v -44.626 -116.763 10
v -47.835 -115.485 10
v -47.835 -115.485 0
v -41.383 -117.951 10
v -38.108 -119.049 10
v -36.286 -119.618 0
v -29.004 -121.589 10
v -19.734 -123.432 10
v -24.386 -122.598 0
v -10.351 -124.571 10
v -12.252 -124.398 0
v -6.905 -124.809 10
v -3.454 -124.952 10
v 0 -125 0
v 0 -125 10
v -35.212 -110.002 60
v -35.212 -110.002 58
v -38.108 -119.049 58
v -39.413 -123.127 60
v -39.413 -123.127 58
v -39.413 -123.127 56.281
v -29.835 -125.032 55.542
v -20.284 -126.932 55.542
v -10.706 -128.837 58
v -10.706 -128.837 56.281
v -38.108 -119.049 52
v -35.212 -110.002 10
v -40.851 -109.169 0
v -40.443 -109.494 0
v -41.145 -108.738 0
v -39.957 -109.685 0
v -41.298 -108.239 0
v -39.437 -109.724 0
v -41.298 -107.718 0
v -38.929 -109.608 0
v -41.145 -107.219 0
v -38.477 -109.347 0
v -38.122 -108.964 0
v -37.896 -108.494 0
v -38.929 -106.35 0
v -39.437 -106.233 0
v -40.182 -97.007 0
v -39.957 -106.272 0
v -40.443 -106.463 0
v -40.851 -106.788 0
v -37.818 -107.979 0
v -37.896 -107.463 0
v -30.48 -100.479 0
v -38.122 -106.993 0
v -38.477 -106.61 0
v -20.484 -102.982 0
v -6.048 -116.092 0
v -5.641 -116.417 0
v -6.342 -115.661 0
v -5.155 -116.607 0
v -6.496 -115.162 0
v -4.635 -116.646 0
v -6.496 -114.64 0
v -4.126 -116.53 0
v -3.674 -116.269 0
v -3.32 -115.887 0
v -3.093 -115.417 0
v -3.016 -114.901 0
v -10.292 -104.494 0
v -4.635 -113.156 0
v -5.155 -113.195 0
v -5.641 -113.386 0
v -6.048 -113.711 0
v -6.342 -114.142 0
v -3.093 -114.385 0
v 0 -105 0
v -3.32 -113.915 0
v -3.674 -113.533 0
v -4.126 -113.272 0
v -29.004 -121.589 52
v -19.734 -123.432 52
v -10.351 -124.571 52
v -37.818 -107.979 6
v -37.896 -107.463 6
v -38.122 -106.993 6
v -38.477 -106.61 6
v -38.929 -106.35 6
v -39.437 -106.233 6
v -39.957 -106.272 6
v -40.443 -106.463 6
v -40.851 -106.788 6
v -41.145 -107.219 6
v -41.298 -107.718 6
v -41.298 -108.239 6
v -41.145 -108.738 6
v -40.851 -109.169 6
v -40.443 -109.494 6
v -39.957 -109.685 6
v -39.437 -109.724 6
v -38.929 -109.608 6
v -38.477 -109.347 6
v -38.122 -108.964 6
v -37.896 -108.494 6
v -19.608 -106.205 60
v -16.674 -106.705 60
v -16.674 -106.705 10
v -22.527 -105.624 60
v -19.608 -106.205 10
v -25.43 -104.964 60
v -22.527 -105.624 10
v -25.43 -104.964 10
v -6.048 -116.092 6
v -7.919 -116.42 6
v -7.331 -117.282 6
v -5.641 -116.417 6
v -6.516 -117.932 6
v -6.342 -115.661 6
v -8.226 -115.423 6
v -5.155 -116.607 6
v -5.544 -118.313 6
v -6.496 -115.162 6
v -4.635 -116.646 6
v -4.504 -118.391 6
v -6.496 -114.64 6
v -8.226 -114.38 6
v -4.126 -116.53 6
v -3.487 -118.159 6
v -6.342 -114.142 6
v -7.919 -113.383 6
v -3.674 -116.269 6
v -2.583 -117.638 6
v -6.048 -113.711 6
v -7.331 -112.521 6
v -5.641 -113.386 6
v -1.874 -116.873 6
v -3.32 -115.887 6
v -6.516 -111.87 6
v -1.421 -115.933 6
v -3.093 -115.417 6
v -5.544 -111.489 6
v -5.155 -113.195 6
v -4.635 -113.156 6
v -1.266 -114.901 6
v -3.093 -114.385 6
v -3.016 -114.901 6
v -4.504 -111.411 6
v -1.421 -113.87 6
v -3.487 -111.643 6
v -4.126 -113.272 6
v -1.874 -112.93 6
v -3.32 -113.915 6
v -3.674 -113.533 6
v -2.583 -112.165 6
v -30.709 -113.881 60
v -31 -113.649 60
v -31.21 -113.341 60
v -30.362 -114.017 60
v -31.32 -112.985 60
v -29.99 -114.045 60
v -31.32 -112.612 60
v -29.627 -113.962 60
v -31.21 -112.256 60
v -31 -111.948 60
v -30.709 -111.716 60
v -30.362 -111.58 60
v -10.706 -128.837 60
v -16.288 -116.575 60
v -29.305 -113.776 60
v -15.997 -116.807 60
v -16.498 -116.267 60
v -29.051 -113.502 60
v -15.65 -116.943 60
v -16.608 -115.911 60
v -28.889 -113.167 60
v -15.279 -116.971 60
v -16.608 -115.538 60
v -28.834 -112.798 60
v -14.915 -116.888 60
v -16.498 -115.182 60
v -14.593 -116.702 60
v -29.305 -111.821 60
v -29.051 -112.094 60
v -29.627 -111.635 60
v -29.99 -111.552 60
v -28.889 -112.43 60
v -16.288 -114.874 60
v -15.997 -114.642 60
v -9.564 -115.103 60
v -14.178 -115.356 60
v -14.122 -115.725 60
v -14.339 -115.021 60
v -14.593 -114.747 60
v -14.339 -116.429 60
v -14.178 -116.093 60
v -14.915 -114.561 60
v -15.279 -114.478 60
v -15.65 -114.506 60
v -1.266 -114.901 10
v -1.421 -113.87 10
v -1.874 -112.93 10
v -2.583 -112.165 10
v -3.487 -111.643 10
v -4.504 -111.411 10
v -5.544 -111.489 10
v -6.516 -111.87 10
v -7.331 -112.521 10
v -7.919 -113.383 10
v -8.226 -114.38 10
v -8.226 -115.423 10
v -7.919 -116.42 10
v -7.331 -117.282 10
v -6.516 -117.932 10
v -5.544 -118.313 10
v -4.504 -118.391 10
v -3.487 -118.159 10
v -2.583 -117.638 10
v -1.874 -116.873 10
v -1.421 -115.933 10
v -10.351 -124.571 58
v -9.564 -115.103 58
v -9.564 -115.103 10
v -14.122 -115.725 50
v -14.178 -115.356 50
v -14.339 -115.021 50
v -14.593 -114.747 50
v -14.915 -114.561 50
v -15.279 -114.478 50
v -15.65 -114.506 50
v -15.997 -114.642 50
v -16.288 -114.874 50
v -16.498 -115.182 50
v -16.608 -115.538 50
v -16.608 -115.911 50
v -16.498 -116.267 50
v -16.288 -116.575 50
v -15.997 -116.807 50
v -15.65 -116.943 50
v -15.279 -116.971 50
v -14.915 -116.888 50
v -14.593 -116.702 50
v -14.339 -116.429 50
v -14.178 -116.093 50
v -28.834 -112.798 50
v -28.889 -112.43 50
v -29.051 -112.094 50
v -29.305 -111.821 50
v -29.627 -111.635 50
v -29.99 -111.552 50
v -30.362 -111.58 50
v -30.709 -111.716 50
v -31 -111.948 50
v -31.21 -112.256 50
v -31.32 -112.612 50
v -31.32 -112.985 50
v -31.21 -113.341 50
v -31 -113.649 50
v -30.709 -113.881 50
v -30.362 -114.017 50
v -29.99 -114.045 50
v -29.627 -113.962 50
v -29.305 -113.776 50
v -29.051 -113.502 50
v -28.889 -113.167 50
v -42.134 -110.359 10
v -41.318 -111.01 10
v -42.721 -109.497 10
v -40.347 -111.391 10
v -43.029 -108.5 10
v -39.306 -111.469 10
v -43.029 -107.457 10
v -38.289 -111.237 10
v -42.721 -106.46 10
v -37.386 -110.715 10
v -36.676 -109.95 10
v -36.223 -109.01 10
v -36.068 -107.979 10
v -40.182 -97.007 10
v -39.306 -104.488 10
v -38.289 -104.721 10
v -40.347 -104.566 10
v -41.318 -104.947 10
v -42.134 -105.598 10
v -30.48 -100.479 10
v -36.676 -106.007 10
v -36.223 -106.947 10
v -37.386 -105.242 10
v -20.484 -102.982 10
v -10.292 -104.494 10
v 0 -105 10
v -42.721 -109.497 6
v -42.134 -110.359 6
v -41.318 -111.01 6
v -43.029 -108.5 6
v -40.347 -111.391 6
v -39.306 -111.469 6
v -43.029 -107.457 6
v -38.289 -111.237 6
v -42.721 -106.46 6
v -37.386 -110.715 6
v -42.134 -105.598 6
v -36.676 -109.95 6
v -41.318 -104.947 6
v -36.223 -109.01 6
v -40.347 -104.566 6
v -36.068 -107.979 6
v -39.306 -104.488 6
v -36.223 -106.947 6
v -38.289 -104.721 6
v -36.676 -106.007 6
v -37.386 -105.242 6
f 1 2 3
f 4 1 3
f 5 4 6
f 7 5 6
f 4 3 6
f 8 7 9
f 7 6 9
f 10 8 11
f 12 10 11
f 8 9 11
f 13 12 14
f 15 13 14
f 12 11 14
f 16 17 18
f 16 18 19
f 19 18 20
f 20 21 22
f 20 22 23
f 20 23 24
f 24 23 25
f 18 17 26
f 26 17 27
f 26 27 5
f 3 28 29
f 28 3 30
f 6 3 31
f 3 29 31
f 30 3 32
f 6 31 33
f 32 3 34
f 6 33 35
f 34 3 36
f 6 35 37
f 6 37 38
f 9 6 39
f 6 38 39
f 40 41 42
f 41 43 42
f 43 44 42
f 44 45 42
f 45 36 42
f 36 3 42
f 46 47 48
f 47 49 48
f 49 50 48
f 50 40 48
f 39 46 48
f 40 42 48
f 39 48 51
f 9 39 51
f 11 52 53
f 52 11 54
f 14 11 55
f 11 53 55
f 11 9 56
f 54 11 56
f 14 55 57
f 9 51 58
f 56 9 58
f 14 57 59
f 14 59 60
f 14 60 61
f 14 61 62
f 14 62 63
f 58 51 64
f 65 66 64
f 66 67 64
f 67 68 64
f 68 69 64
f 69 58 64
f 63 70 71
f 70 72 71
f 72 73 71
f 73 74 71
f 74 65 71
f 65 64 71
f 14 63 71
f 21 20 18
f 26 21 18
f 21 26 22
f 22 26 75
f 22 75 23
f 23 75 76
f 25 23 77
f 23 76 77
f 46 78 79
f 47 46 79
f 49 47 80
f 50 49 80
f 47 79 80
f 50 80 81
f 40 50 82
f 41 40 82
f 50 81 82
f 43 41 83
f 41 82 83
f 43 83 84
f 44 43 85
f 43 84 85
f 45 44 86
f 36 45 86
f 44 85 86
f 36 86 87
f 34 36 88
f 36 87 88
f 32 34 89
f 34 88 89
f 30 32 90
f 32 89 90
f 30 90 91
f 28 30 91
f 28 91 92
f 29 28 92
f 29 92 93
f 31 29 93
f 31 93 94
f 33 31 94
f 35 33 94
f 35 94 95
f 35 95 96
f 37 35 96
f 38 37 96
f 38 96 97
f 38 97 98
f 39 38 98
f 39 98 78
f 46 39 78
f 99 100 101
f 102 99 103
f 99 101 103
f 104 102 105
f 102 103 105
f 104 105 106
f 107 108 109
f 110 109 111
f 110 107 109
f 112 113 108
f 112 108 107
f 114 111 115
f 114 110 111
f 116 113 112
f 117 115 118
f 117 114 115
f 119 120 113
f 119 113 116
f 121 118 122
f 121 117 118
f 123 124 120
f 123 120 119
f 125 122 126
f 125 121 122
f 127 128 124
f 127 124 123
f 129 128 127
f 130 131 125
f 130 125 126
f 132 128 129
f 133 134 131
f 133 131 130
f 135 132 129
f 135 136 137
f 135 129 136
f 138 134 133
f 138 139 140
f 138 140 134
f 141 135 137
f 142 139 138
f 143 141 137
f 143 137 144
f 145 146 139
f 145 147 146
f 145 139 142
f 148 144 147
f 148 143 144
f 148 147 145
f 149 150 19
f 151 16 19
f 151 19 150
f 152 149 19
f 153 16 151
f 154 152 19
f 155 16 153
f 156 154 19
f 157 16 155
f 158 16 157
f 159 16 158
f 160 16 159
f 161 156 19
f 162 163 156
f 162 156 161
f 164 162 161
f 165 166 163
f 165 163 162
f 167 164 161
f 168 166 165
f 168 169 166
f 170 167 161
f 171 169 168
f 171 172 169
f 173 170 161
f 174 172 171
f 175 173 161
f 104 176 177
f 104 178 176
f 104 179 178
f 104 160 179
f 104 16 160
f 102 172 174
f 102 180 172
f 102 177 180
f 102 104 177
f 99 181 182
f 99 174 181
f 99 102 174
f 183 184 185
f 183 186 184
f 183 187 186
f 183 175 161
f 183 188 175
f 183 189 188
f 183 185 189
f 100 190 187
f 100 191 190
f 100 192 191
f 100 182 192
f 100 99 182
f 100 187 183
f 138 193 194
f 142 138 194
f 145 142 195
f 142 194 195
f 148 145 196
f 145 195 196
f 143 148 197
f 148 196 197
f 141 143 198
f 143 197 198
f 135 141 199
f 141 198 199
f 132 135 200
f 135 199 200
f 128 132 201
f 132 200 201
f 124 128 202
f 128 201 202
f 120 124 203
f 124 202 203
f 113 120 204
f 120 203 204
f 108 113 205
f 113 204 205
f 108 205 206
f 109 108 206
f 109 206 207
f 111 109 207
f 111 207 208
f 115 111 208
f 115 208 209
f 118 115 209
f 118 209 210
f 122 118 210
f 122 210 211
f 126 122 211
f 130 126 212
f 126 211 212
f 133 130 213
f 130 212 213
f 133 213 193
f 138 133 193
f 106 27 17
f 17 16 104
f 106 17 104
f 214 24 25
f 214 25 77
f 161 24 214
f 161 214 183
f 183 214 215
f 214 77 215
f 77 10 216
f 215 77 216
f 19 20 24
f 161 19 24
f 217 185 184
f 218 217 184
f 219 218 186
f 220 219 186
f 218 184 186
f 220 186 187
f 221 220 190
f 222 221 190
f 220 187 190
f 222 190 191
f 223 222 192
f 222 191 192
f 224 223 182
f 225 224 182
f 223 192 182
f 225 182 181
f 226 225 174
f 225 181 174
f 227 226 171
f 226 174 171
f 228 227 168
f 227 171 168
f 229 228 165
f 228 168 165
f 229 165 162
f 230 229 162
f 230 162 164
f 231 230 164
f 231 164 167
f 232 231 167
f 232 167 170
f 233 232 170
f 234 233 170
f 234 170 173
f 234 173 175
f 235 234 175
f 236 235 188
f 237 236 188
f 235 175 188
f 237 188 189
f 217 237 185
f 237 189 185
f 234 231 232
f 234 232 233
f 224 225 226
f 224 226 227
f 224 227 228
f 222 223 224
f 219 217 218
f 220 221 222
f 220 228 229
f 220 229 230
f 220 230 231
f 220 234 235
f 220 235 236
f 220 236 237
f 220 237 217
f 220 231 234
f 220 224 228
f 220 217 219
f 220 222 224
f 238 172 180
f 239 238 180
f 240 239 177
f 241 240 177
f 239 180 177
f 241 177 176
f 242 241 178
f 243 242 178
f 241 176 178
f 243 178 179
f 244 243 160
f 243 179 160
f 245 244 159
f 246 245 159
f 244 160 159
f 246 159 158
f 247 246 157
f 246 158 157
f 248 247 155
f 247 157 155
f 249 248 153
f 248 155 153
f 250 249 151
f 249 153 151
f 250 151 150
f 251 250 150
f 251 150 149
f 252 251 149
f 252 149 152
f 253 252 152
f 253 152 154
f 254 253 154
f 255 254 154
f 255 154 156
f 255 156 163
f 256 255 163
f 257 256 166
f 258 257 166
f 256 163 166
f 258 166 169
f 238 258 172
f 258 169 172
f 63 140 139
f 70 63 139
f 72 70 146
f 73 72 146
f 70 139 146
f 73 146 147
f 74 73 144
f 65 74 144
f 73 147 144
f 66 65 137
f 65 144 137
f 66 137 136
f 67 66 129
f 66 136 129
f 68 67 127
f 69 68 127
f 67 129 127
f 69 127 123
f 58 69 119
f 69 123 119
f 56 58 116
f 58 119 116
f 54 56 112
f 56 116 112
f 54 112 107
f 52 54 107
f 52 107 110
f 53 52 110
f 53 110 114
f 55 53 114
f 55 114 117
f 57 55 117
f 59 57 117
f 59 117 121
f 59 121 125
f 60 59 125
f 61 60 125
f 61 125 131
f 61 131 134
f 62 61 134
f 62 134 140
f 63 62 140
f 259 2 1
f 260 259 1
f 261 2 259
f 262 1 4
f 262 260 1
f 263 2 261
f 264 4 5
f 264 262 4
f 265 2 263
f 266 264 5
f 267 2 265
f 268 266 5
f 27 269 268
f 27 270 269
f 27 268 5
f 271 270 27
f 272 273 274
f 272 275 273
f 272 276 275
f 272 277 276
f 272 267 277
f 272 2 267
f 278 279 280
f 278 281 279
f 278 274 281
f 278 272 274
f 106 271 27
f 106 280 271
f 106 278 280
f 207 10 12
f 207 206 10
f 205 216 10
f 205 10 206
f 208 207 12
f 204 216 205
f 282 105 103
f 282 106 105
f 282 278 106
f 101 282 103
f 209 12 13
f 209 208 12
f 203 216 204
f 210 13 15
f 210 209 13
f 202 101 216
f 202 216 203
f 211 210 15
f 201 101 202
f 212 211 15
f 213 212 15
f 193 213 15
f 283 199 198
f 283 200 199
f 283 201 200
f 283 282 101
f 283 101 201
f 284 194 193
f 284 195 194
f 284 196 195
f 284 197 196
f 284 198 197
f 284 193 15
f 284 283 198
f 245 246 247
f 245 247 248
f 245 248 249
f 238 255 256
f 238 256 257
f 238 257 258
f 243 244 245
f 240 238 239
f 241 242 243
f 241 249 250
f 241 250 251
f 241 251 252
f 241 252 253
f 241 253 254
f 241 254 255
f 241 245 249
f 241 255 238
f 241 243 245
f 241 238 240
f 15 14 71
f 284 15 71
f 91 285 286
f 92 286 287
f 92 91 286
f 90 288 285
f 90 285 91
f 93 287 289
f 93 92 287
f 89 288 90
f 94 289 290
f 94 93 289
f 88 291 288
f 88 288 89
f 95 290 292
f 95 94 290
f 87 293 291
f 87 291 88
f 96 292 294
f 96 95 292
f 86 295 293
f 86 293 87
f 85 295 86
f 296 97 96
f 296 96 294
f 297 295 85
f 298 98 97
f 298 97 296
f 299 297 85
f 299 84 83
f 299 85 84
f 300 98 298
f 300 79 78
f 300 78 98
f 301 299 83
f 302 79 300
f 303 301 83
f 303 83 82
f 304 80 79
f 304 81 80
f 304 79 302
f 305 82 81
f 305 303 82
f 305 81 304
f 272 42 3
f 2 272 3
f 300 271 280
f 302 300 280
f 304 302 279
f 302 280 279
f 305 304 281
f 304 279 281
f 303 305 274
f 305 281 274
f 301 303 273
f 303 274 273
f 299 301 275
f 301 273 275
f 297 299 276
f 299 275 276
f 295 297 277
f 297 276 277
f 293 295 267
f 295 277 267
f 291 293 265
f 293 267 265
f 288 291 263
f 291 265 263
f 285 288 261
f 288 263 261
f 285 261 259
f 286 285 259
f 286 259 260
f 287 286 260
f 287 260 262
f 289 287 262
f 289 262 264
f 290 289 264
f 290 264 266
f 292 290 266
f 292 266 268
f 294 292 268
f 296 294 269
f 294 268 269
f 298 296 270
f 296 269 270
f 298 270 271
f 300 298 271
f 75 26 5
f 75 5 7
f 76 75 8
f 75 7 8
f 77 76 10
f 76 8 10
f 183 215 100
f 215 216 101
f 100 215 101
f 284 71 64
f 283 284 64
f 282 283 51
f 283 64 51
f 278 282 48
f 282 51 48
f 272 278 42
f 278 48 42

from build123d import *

# Parameters (mm, degrees)
BOSS_EXTRU_1_DEPTH      = 10
BOSS_EXTRU_2_DEPTH      = 48
BOSS_EXTRU_3_DEPTH      = 2
CHANFREIN1_SIZE         = 6
ENL_V_MAT_EXTRU_1_REACH = 148.244
ESQUISSE5_R             = 1.75
ESQUISSE6_R             = 3.5
ENL_V_MAT_EXTRU_2_DEPTH = 4
CHANFREIN2_SIZE         = 7.5
ESQUISSE7_R             = 1.25
ENL_V_MAT_EXTRU_3_DEPTH = 10


with BuildPart() as part:
    # Esquisse1 → Boss.-Extru.1 (new body)
    with BuildSketch(Plane.XY):
        with BuildLine():
            Line((-40.181760398, -97.007350914), (-47.835429046, -115.484941564))
            ThreePointArc((-47.835429046, -115.484941564), (-24.386290252, -122.59816005), (0, -125))
            Line((0, -125), (0, -105))
            ThreePointArc((0, -105), (-20.484483812, -102.982454442), (-40.181760398, -97.007350914))
        make_face()
    extrude(amount=BOSS_EXTRU_1_DEPTH)

    # Esquisse2 → Boss.-Extru.2 (add)
    with BuildSketch(Plane.XY.offset(10)):
        with BuildLine():
            Line((-32.925344295, -102.858746361), (-38.108037379, -119.049474955))
            ThreePointArc((-38.108037379, -119.049474955), (-24.386290252, -122.59816005), (-10.351025939, -124.570687812))
            Line((-10.351025939, -124.570687812), (-8.943286411, -107.62907427))
            ThreePointArc((-8.943286411, -107.62907427), (-21.069754778, -105.924810284), (-32.925344295, -102.858746361))
        make_face()
    extrude(amount=BOSS_EXTRU_2_DEPTH)

    # Esquisse4 → Boss.-Extru.3 (add)
    with BuildSketch(Plane.XY.offset(58)):
        with BuildLine():
            Line((-39.413172773, -123.12671677), (-10.705530953, -128.837021766))
            Line((-10.705530953, -128.837021766), (-8.943286411, -107.62907427))
            ThreePointArc((-8.943286411, -107.62907427), (-21.069754778, -105.924810284), (-32.925344295, -102.858746361))
            Line((-32.925344295, -102.858746361), (-39.413172773, -123.12671677))
        make_face()
    extrude(amount=BOSS_EXTRU_3_DEPTH)

    # Chanfrein1
    # the kernel refuses this chamfer: 6 mm, written as the material it adds along each edge
    with BuildSketch(Plane(origin=(0, 0, 58), x_dir=(-0.3048642990280114, -0.9523957996432781, 0), z_dir=(-0.9523957996432781, 0.3048642990280114, 0))) as chanfrein1_piece_1_section:
        Polygon((125 + CHANFREIN1_SIZE, 0), (125, -CHANFREIN1_SIZE), (125, 0), align=None)
    chanfrein1_piece_1 = revolve(axis=Axis((0, 0, 58), (0, 0, 1)), revolution_arc=13, mode=Mode.PRIVATE)
    chanfrein1_piece_1 = split(chanfrein1_piece_1, bisect_by=Plane(origin=(-25.059351863, -125.981869268, 58), z_dir=(0.19509032201612828, 0.9807852804032304, 0)), keep=Keep.TOP, mode=Mode.PRIVATE)
    add(chanfrein1_piece_1)

    # Esquisse5 → Enlèv. mat.-Extru.1 (cut, up to next)
    with BuildSketch(Plane.XY.offset(10), mode=Mode.PRIVATE) as enl_v_mat_extru_1_sk1:
        with Locations((-4.765565521, -114.901215769)):
            Circle(ESQUISSE5_R)
    enl_v_mat_extru_1_tool1 = extrude(enl_v_mat_extru_1_sk1.sketch, amount=-ENL_V_MAT_EXTRU_1_REACH, mode=Mode.PRIVATE) & part.part
    # Esquisse5 → Enlèv. mat.-Extru.1 (cut, up to next)
    with BuildSketch(Plane.XY.offset(10), mode=Mode.PRIVATE) as enl_v_mat_extru_1_sk2:
        with Locations((-39.567983188, -107.978584481)):
            Circle(ESQUISSE5_R)
    enl_v_mat_extru_1_tool2 = extrude(enl_v_mat_extru_1_sk2.sketch, amount=-ENL_V_MAT_EXTRU_1_REACH, mode=Mode.PRIVATE) & part.part
    add(enl_v_mat_extru_1_tool1.solids().sort_by_distance((-4.765566, -114.901216, 10))[0], mode=Mode.SUBTRACT)
    add(enl_v_mat_extru_1_tool2.solids().sort_by_distance((-39.567983, -107.978584, 10))[0], mode=Mode.SUBTRACT)

    # Esquisse6 → Enlèv. mat.-Extru.2 (cut)
    with BuildSketch(Plane.XY.offset(10)):
        with Locations((-39.567983188, -107.978584481)):
            Circle(ESQUISSE6_R)
        with Locations((-4.765565521, -114.901215769)):
            Circle(ESQUISSE6_R)
    extrude(amount=-ENL_V_MAT_EXTRU_2_DEPTH, mode=Mode.SUBTRACT)

    # Chanfrein2
    # the kernel refuses this chamfer: 7.5 mm, written as the material it takes off along each edge
    with BuildSketch(Plane(origin=(-8.943286411, -107.62907427, 10), x_dir=(-0.08280820751335238, -0.996565502497666, 0), z_dir=(0, 0, 1)), Plane(origin=(-32.925344295, -102.858746361, 80.019854797), x_dir=(-0.3048642990290983, -0.9523957996429303, 0), z_dir=(0, 0, -1))) as chanfrein2_piece_1:
        with BuildLine():
            Line((CHANFREIN2_SIZE, 0), (-0.280634385, -7.780634385))
            ThreePointArc((-0.280634385, -7.780634385), (-0.074202159, -4.002769088), (0, 0))
            Line((0, 0), (CHANFREIN2_SIZE, 0))
        make_face()
    extrude(amount=70.019854797, mode=Mode.SUBTRACT)

    # Esquisse7 → Enlèv. mat.-Extru.3 (cut)
    with BuildSketch(Plane.XY.offset(60)):
        with Locations((-30.083912118, -112.798307752)):
            Circle(ESQUISSE7_R)
        with Locations((-15.372132912, -115.724662582)):
            Circle(ESQUISSE7_R)
    extrude(amount=-ENL_V_MAT_EXTRU_3_DEPTH, mode=Mode.SUBTRACT)


solid = part.part
